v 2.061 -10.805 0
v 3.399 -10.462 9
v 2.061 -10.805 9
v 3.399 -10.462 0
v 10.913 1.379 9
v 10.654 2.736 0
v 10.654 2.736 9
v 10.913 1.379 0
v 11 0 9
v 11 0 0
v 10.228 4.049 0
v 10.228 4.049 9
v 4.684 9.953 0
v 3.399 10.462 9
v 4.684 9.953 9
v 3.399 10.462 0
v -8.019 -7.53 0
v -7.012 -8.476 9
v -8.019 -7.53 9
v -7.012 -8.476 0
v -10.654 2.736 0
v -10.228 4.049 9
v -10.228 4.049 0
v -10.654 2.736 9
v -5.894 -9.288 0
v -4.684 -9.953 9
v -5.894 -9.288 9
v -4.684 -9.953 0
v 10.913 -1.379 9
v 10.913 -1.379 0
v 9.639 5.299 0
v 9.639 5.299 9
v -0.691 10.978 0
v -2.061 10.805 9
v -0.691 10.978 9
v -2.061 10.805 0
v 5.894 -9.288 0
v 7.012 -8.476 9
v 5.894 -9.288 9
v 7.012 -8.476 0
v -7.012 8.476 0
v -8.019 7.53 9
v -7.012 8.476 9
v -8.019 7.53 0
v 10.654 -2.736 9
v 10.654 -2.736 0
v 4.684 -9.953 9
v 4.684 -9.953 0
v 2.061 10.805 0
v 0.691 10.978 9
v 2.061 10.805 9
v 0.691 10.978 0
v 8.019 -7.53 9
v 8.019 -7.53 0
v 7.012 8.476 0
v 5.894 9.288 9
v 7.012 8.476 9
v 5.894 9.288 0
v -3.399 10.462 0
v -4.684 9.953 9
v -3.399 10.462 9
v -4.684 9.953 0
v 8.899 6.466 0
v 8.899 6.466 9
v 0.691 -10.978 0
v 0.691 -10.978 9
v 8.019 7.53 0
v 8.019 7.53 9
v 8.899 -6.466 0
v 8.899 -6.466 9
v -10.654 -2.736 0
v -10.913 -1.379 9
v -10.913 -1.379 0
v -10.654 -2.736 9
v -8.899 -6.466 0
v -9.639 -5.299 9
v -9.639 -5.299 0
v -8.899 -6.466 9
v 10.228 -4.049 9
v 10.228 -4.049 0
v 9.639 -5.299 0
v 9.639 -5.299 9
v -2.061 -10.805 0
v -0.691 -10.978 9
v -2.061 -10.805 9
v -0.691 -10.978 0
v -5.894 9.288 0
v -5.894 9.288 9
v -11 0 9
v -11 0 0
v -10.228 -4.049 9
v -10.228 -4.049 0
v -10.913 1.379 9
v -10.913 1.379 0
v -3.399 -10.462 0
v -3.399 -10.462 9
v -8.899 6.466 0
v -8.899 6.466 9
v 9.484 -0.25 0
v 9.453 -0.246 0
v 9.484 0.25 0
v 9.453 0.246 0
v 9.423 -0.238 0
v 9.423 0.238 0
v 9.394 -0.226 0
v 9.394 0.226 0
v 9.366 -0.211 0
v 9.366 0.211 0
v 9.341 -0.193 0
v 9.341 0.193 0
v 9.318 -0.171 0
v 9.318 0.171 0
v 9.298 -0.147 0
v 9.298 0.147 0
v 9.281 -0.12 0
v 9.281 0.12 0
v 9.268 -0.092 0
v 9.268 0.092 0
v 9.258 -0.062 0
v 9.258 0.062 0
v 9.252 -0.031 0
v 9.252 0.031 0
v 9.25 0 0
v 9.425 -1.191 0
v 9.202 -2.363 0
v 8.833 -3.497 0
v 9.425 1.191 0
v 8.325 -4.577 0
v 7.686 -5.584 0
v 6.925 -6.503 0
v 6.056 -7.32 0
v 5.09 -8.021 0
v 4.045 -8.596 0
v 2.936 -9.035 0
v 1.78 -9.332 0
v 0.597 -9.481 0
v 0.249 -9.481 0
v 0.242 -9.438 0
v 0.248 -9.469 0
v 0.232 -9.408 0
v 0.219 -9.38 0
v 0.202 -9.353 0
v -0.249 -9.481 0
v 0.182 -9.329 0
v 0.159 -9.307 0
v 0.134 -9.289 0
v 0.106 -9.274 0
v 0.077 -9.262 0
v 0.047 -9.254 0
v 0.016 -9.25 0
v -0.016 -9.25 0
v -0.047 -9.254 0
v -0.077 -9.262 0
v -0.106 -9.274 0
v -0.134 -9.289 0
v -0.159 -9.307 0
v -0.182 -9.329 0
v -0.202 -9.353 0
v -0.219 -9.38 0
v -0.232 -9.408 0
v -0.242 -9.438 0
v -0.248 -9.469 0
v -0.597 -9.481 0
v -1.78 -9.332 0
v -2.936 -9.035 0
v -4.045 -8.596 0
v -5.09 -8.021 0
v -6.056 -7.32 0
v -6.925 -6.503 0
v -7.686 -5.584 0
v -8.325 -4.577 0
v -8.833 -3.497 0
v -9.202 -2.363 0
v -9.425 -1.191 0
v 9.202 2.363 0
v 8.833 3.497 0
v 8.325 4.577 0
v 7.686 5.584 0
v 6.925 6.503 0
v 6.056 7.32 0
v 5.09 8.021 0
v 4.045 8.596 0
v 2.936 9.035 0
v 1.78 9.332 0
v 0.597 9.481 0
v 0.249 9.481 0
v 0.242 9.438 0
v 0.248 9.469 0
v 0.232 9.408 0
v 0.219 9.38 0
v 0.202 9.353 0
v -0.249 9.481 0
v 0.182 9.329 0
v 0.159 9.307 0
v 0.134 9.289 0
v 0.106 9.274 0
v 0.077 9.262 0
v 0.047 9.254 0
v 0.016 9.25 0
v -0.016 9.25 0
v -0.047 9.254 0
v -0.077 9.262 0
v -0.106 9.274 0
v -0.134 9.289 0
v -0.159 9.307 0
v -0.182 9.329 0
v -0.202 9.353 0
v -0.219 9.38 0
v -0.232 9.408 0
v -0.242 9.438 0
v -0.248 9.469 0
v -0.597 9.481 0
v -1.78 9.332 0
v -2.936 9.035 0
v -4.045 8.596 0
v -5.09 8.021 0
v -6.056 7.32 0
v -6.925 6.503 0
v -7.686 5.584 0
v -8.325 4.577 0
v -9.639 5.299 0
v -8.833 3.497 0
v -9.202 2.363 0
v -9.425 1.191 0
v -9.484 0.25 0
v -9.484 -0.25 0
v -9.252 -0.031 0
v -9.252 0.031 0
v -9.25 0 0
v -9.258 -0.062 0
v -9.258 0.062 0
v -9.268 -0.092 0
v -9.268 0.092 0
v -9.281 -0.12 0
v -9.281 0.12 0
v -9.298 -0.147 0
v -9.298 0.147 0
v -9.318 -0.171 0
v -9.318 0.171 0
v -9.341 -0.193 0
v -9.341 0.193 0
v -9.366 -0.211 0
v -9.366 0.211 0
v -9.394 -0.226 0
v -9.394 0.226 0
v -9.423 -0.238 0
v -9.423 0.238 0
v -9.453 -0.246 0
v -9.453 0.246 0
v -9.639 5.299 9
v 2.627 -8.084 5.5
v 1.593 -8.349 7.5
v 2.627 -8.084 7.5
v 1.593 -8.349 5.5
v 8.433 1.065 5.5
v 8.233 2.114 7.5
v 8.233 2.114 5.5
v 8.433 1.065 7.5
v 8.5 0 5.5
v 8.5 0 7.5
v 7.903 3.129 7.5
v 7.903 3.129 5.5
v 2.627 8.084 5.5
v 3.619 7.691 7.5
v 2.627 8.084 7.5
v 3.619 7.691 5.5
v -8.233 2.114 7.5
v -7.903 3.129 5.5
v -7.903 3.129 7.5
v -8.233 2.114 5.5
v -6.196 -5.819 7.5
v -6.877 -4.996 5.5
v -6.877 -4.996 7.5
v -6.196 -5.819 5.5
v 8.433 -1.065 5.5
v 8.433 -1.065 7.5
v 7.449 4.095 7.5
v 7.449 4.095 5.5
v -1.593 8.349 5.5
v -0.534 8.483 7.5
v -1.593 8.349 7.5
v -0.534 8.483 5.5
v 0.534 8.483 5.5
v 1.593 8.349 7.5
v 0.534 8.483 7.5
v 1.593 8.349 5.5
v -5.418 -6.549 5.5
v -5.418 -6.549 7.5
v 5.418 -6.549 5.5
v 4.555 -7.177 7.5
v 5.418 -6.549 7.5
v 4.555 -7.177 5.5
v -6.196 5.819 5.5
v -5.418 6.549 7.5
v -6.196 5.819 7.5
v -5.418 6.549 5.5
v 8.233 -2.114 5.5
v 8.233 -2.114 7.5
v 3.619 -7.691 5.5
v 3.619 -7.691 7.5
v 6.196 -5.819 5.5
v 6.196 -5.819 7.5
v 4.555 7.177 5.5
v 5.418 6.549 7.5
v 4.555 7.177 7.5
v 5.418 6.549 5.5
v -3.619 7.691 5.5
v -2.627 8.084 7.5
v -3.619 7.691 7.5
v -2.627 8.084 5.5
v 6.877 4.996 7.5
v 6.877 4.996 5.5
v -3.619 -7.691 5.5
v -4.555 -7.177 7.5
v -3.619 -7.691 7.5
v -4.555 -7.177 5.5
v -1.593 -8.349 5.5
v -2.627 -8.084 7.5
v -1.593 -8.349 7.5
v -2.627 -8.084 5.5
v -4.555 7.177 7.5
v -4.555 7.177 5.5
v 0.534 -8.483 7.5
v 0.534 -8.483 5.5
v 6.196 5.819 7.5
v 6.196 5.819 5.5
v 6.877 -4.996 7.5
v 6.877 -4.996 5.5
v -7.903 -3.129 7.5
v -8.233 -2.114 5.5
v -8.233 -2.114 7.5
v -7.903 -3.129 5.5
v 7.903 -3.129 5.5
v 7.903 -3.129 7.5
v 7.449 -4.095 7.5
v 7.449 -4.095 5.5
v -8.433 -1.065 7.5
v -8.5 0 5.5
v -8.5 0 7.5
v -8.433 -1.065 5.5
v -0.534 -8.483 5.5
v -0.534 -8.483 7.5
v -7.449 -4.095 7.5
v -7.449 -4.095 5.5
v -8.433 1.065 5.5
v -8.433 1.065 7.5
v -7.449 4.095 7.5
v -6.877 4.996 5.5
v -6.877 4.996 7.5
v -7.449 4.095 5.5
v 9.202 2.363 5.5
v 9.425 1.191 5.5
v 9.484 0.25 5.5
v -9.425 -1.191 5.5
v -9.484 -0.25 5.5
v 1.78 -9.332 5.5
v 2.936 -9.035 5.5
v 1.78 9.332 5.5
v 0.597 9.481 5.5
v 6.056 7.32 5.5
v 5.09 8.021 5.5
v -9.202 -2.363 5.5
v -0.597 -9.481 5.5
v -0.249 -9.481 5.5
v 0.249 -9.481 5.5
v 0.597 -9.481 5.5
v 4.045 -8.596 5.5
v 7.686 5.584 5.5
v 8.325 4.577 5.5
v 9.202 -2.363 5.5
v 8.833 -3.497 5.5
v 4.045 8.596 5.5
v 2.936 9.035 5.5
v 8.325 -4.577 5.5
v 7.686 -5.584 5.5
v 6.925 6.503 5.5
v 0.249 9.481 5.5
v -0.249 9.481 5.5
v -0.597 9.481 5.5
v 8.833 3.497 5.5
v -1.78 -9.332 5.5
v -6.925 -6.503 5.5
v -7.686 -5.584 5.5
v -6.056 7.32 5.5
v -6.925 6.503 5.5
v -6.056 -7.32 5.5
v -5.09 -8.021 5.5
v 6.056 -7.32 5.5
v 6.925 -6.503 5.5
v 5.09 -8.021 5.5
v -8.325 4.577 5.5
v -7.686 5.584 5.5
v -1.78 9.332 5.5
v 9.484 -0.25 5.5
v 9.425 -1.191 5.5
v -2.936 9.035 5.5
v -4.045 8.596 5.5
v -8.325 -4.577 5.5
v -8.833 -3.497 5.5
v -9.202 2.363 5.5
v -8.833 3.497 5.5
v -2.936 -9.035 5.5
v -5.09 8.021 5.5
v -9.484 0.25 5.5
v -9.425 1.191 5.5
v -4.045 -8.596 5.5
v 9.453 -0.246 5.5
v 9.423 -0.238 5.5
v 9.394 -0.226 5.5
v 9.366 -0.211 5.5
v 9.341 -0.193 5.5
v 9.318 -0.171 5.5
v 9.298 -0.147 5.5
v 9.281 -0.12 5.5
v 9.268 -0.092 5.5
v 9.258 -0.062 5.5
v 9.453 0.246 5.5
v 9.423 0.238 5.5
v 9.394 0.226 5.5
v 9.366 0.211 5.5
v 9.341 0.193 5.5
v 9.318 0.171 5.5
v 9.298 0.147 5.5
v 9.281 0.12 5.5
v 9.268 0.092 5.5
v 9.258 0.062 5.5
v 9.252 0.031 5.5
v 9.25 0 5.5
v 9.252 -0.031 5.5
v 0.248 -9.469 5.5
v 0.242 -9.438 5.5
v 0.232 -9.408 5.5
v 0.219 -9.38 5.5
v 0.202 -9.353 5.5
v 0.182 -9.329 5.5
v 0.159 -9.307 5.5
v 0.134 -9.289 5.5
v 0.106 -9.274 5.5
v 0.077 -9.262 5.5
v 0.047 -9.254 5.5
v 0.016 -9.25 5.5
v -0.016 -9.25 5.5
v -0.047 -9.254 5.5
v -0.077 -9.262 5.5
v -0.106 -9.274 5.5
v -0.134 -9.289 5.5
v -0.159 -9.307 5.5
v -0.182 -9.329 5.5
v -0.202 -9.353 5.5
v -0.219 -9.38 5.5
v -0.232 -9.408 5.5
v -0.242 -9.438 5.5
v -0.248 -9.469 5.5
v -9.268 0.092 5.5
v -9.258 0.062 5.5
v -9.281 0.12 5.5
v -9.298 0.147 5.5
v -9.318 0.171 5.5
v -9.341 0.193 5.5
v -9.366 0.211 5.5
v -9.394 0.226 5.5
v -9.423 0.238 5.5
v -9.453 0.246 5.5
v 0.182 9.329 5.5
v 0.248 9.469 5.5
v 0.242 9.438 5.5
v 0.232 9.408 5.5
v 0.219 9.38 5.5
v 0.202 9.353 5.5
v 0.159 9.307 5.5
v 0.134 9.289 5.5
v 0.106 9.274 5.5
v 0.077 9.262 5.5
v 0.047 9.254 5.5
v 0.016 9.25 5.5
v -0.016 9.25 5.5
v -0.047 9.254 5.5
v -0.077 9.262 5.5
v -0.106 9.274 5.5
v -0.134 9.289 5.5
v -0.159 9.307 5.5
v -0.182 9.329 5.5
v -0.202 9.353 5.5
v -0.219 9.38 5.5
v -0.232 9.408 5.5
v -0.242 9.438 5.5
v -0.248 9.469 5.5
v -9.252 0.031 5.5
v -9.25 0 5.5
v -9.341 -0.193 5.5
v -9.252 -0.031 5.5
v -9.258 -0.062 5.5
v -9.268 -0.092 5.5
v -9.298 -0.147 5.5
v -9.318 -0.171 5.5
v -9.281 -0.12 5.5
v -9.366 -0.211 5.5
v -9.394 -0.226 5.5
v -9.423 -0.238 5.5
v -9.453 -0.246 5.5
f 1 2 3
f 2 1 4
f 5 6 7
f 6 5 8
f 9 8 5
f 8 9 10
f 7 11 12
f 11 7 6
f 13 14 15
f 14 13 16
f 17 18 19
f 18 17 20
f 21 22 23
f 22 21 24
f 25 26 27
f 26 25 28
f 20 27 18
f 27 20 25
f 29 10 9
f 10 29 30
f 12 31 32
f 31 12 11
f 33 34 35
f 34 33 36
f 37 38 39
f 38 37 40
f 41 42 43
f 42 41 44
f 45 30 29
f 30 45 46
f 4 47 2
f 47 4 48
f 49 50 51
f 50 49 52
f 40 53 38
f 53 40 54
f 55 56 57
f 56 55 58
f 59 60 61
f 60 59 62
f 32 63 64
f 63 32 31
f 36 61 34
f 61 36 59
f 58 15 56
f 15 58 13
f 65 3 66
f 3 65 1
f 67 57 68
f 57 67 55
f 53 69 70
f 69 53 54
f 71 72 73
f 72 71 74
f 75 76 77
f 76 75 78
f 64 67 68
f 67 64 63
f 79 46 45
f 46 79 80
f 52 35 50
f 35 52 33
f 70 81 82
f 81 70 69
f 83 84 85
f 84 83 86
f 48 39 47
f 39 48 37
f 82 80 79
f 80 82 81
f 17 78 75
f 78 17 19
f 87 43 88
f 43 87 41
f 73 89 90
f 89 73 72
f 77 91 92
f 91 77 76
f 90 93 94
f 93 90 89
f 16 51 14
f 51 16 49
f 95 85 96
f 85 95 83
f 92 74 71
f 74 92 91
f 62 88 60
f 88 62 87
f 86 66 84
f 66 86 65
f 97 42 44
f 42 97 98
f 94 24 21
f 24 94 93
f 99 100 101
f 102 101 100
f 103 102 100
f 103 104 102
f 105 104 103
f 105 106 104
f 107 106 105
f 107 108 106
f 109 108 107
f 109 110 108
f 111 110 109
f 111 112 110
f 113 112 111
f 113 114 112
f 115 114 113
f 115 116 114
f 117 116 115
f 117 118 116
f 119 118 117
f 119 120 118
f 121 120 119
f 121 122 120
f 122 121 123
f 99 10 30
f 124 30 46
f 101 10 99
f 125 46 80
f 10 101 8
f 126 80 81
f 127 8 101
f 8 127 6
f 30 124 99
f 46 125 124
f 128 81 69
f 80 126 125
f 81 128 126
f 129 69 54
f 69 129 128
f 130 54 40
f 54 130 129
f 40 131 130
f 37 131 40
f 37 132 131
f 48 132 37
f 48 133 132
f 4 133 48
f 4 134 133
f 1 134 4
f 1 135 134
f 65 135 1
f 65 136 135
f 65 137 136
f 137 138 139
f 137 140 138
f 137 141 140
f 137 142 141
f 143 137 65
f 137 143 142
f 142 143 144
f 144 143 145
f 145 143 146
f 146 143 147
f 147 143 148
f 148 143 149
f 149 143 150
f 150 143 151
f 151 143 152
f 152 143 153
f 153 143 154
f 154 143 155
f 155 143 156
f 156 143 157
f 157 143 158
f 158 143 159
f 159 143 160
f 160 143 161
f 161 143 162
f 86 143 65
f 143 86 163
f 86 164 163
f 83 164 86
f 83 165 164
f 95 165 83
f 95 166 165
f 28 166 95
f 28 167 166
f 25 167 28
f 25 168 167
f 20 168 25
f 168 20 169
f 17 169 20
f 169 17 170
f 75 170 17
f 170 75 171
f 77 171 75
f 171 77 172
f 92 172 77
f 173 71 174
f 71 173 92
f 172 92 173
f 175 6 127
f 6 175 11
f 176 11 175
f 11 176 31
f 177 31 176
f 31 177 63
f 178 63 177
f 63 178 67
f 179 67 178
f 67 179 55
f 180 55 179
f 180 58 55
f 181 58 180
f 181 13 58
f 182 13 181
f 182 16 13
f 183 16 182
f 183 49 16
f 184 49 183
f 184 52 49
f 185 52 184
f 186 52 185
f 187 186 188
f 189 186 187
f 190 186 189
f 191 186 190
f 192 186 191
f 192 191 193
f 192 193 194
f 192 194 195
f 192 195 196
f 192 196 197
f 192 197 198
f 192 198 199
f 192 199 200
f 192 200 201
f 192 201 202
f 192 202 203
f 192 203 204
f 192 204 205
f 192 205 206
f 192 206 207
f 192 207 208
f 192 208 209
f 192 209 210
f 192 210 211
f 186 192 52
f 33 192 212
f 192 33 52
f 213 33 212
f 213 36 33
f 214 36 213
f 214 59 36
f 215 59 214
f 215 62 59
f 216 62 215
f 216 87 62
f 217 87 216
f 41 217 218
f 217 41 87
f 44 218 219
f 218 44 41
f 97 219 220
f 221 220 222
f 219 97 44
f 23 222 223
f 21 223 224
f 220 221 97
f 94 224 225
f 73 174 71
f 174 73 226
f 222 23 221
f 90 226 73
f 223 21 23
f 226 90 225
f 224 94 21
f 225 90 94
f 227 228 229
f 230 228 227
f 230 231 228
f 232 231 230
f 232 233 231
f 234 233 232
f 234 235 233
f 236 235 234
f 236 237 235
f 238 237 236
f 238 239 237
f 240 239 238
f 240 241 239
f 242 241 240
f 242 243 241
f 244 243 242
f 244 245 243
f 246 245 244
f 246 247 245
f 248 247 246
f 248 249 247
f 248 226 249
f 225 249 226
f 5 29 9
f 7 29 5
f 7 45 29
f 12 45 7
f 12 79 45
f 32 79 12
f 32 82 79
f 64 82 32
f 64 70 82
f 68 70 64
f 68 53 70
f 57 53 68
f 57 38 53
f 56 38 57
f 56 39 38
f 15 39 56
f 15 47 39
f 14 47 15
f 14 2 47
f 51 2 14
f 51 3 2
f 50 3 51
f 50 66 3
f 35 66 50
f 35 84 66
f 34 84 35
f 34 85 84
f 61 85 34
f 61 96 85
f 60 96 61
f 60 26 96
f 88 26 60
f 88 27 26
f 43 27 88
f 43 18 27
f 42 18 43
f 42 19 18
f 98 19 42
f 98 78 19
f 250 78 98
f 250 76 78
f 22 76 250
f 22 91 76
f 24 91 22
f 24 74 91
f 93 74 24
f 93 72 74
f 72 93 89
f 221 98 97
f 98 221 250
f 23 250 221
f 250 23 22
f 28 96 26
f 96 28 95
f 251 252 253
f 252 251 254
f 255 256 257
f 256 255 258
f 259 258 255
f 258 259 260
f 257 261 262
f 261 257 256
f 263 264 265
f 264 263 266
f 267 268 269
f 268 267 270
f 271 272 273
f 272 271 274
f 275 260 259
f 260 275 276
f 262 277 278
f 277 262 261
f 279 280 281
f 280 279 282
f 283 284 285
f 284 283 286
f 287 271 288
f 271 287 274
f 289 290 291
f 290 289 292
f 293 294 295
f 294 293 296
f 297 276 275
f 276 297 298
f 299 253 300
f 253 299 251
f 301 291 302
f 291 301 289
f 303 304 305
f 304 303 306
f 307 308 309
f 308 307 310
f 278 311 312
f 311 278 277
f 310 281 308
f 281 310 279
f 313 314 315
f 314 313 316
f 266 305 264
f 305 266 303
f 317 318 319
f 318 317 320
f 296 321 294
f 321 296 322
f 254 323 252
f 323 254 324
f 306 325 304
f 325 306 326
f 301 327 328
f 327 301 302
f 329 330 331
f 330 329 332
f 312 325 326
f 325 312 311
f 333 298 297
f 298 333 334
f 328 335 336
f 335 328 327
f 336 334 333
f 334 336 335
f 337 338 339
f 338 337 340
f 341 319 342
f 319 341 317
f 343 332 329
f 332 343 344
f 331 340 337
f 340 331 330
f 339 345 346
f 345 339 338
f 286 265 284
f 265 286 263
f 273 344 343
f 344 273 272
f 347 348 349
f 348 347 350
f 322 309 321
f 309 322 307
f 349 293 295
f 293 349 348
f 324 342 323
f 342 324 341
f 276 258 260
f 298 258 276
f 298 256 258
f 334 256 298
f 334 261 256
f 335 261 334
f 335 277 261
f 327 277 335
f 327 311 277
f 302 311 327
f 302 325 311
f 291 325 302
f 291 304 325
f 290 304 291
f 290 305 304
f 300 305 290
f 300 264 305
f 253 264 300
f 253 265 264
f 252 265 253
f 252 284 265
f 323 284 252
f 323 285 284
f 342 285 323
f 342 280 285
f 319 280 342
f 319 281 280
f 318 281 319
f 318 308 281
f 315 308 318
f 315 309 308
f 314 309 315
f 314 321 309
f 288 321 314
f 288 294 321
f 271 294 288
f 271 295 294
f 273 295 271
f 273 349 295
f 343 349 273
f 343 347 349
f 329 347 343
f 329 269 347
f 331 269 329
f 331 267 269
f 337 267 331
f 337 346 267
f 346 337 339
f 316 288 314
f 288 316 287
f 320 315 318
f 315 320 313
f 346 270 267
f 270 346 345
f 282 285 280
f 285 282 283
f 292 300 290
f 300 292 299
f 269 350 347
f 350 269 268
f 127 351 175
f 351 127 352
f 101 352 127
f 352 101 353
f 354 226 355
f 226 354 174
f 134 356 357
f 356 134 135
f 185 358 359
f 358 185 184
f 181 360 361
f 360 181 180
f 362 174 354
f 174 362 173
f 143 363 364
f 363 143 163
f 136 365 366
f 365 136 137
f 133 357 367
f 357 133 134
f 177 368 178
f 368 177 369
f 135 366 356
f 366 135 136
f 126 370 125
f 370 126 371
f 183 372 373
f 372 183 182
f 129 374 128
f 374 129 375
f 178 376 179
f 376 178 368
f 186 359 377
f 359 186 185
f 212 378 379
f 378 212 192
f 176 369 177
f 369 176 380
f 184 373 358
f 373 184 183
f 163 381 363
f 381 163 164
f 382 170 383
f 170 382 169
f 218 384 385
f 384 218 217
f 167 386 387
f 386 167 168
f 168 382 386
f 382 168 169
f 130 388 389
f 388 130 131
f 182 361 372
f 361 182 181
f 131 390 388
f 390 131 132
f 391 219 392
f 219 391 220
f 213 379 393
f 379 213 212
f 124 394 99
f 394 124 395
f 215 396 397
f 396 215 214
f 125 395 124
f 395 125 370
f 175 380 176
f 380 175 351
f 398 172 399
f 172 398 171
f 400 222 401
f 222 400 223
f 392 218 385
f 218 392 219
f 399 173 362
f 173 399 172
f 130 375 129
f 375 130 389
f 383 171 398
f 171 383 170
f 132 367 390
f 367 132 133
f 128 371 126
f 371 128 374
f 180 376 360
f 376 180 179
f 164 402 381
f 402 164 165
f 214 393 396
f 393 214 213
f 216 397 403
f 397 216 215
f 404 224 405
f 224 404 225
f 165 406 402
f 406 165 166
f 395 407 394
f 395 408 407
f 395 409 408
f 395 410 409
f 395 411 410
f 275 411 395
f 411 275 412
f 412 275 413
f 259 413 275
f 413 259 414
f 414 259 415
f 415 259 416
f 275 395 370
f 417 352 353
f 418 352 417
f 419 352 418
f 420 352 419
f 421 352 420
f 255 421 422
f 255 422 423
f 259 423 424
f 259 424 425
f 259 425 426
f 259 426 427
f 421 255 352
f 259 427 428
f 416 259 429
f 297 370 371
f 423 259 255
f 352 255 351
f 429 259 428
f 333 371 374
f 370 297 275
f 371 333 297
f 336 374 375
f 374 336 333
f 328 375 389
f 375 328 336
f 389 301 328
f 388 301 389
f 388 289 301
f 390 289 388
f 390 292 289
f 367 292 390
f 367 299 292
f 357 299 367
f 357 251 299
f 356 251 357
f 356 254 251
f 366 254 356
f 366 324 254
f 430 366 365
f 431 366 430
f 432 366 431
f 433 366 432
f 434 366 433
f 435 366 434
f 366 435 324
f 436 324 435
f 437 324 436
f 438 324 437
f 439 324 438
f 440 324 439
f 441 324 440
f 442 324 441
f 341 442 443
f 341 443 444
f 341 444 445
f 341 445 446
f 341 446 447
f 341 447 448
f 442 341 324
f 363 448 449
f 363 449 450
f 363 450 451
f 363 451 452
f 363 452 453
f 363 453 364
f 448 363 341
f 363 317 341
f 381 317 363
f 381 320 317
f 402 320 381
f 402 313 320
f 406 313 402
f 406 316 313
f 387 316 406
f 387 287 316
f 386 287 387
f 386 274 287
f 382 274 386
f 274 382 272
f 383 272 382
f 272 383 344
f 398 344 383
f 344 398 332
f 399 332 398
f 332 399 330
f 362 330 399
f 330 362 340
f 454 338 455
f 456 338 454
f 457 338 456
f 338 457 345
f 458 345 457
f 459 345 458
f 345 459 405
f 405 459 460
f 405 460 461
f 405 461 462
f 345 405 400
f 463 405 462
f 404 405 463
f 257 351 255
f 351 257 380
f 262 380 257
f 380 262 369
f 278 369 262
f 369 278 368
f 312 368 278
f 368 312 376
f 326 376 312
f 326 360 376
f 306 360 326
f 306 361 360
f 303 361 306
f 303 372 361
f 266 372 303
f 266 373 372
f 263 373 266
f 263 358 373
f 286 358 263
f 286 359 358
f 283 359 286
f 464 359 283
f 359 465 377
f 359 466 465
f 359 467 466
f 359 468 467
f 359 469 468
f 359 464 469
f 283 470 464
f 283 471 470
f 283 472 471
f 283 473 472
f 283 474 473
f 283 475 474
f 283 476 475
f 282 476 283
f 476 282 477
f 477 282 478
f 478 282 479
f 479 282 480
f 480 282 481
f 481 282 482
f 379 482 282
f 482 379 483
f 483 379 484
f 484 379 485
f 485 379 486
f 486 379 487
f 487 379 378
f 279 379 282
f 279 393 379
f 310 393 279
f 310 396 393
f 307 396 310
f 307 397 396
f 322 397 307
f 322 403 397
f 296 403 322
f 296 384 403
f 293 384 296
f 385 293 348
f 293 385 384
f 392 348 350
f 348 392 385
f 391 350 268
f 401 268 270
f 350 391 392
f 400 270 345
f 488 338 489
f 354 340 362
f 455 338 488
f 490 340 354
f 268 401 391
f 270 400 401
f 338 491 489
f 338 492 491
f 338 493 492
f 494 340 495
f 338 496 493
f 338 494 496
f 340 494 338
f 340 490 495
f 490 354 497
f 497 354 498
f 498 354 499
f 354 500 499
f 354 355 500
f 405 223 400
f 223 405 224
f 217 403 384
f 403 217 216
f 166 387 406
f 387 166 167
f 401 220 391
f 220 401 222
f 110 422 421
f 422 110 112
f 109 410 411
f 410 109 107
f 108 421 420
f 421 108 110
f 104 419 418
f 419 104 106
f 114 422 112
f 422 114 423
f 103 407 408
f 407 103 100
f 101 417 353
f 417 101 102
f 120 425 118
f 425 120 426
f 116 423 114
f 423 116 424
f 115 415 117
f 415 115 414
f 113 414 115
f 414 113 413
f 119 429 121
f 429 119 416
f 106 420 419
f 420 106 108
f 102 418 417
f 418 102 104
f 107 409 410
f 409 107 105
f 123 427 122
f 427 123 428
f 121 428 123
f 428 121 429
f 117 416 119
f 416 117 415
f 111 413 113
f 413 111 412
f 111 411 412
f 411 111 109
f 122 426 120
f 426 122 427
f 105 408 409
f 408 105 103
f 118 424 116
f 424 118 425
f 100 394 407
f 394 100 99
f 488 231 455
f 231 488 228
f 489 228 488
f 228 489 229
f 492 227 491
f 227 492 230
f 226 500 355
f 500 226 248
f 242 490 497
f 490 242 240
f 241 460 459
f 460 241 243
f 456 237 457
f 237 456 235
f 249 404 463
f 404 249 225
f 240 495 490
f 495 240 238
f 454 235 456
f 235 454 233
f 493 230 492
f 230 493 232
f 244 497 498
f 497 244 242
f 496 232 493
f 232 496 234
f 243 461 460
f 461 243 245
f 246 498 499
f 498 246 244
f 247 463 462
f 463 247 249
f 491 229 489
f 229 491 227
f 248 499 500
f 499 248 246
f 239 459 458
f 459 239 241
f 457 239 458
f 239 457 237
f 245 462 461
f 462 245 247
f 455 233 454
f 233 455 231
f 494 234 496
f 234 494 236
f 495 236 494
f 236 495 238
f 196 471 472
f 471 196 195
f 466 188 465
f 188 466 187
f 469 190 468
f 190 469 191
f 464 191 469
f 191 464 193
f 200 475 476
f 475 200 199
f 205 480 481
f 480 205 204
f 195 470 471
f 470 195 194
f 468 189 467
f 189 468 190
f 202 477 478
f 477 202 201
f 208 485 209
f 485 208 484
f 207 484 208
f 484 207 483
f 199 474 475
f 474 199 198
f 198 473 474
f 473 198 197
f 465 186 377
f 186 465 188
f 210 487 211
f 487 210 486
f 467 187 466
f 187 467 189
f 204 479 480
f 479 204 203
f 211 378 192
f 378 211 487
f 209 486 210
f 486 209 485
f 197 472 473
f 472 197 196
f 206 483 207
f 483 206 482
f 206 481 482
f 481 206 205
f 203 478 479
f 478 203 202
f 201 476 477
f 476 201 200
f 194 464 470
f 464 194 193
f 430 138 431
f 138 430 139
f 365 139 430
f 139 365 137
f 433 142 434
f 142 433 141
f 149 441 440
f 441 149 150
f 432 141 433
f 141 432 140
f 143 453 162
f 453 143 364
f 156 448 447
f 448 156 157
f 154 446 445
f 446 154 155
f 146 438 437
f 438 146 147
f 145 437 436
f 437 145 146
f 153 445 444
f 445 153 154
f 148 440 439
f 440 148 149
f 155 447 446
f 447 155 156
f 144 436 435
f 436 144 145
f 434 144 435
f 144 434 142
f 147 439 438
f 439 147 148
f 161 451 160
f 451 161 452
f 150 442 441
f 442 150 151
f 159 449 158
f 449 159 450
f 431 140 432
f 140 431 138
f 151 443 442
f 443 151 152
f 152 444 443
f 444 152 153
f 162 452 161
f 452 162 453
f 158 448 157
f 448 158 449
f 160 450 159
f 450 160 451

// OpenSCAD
module lenscap (id, thick, ridge, depth)
{
  $fn=50;
  difference() {
    cylinder(r=id/2+thick,h=depth);
    translate([0,0,-thick]) cylinder(r=id/2-1,h=depth);
    translate([0,0,-thick-ridge]) cylinder(r=id/2,h=depth);
  }
  translate([id/2,0,0]) cylinder(r=.25,h=depth);
  translate([-id/2,0,0]) cylinder(r=.25,h=depth);
  translate([0,id/2,0]) cylinder(r=.25,h=depth);
  translate([0,-id/2,0]) cylinder(r=.25,h=depth);
}


lenscap(19, 1.5, 2, 9);
